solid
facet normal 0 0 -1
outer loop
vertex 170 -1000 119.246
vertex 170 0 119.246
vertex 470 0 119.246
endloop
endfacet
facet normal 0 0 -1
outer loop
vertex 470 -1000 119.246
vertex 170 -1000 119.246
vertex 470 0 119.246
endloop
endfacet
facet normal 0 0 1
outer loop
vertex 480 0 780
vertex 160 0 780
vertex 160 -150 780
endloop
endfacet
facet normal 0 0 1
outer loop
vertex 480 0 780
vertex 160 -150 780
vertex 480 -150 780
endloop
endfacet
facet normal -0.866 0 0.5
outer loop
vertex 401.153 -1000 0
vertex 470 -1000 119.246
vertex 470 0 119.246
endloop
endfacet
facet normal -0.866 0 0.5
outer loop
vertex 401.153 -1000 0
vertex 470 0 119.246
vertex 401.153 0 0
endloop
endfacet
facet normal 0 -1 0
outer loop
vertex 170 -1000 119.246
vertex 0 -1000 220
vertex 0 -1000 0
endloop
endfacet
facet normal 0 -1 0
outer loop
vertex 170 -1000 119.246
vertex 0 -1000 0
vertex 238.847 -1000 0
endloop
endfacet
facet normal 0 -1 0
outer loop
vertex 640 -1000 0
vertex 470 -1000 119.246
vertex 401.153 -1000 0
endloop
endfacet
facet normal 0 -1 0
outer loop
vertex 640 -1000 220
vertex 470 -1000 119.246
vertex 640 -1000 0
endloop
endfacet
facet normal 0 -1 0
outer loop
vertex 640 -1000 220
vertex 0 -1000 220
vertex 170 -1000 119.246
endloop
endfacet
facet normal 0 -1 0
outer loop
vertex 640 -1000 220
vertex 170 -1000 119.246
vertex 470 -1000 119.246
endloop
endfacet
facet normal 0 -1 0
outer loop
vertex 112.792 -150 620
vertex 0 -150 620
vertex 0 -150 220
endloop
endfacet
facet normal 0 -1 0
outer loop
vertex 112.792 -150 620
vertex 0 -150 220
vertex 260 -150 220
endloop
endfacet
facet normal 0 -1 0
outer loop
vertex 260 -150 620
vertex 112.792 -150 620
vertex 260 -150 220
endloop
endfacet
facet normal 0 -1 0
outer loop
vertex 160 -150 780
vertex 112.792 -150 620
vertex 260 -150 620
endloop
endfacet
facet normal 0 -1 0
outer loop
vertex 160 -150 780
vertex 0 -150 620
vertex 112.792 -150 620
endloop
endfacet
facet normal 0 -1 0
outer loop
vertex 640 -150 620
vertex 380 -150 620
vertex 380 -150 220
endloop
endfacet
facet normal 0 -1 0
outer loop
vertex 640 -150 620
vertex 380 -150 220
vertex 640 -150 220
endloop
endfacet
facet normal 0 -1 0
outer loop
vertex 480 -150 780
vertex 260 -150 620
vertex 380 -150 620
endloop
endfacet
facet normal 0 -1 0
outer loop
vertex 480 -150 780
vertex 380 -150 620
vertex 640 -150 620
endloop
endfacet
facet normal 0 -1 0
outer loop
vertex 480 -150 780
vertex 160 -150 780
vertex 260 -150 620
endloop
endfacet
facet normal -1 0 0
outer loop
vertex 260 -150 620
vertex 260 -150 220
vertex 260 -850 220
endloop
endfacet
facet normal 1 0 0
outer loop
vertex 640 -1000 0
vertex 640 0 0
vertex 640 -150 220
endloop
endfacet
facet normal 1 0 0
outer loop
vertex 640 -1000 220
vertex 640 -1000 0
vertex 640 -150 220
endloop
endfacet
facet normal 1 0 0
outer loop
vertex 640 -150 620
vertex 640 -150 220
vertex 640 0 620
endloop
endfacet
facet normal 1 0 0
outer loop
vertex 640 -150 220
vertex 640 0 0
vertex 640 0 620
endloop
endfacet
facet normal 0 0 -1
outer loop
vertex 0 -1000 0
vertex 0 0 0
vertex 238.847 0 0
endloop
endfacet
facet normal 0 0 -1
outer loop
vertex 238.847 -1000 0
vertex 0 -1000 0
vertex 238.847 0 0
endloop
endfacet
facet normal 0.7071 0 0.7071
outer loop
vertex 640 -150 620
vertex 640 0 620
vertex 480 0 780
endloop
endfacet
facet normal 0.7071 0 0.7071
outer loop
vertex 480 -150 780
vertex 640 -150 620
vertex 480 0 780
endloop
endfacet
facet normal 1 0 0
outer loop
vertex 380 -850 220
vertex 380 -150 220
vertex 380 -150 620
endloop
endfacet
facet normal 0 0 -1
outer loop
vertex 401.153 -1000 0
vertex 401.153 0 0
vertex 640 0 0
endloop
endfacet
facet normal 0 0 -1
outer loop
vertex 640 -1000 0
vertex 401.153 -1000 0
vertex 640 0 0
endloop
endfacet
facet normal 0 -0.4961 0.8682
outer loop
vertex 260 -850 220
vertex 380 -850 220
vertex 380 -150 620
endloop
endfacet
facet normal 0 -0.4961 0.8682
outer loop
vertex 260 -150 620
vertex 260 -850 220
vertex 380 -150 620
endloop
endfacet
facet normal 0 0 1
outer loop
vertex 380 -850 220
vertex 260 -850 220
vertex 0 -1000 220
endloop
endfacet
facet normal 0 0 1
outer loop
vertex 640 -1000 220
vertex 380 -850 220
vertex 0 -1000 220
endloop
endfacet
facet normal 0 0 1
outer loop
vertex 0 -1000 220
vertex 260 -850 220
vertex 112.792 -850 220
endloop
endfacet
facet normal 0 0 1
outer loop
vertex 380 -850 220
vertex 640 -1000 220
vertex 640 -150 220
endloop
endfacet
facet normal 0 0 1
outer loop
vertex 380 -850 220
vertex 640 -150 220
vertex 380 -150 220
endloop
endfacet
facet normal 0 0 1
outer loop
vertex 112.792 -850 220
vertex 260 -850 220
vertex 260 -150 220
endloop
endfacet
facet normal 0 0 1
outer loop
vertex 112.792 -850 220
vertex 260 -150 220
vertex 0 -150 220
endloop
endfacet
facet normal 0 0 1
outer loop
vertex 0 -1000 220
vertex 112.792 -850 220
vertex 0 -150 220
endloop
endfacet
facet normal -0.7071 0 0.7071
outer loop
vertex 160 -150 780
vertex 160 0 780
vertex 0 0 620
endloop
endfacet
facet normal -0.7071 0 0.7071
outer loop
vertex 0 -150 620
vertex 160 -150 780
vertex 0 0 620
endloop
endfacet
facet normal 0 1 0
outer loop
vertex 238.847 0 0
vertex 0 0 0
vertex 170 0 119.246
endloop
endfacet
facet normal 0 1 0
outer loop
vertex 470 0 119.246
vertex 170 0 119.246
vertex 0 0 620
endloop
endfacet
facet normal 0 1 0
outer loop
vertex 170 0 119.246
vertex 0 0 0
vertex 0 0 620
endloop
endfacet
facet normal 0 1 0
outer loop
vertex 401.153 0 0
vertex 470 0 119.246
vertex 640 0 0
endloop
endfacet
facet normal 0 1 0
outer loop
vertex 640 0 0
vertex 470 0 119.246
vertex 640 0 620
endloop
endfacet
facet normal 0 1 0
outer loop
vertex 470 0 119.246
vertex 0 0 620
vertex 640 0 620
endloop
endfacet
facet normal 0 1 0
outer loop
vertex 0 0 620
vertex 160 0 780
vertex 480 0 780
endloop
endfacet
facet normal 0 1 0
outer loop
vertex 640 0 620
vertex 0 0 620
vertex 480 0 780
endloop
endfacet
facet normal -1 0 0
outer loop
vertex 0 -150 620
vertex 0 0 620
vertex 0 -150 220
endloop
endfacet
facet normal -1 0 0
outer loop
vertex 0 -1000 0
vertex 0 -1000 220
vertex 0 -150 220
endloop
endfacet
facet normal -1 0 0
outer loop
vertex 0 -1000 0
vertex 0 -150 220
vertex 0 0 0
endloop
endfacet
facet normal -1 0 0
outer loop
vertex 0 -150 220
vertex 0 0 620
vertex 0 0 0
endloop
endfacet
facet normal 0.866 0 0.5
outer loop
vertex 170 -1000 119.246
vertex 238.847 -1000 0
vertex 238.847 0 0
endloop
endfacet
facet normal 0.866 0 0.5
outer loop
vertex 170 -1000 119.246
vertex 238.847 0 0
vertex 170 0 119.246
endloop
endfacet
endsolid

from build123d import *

# Parameters (mm, degrees)
F1_DEPTH = 1000
F0_W     = 320
F0_H     = 160
F2_DEPTH = 150
F3_W     = 120
F3_H     = 400
F4_DEPTH = 700
F6_DEPTH = 267.208


with BuildPart() as f1:
    # F0 (on Front) → F1 (new body)
    with BuildSketch(Plane.XZ):
        Polygon((0, 220), (0, 0), (238.846631, 0), (170, 119.245863), (470, 119.245863), (401.153369, 0), (640, 0), (640, 220), align=None)
    extrude(amount=F1_DEPTH)

    # F0 (on Front) → F2 (join)
    with BuildSketch(Plane.XZ):
        Polygon((0, 620), (0, 220), (640, 220), (640, 620), (480, 620), (160, 620), align=None)
        Polygon((480, 620), (640, 620), (480, 780), align=None)
        with Locations((320, 700)):
            Rectangle(F0_W, F0_H)
        Polygon((160, 780), (0, 620), (160, 620), align=None)
    extrude(amount=F2_DEPTH)

    # F3 (on face) → F4 (join)
    with BuildSketch(Plane.XZ.offset(150)):
        with Locations((320, 420)):
            Rectangle(F3_W, F3_H)
    extrude(amount=F4_DEPTH)

    # F5 (on face) → F6 (cut)
    with BuildSketch(Plane.YZ.offset(380)):
        Polygon((-850, 620), (-850, 220), (-150, 620), align=None)
    extrude(amount=-F6_DEPTH, mode=Mode.SUBTRACT)


solid = f1.part
